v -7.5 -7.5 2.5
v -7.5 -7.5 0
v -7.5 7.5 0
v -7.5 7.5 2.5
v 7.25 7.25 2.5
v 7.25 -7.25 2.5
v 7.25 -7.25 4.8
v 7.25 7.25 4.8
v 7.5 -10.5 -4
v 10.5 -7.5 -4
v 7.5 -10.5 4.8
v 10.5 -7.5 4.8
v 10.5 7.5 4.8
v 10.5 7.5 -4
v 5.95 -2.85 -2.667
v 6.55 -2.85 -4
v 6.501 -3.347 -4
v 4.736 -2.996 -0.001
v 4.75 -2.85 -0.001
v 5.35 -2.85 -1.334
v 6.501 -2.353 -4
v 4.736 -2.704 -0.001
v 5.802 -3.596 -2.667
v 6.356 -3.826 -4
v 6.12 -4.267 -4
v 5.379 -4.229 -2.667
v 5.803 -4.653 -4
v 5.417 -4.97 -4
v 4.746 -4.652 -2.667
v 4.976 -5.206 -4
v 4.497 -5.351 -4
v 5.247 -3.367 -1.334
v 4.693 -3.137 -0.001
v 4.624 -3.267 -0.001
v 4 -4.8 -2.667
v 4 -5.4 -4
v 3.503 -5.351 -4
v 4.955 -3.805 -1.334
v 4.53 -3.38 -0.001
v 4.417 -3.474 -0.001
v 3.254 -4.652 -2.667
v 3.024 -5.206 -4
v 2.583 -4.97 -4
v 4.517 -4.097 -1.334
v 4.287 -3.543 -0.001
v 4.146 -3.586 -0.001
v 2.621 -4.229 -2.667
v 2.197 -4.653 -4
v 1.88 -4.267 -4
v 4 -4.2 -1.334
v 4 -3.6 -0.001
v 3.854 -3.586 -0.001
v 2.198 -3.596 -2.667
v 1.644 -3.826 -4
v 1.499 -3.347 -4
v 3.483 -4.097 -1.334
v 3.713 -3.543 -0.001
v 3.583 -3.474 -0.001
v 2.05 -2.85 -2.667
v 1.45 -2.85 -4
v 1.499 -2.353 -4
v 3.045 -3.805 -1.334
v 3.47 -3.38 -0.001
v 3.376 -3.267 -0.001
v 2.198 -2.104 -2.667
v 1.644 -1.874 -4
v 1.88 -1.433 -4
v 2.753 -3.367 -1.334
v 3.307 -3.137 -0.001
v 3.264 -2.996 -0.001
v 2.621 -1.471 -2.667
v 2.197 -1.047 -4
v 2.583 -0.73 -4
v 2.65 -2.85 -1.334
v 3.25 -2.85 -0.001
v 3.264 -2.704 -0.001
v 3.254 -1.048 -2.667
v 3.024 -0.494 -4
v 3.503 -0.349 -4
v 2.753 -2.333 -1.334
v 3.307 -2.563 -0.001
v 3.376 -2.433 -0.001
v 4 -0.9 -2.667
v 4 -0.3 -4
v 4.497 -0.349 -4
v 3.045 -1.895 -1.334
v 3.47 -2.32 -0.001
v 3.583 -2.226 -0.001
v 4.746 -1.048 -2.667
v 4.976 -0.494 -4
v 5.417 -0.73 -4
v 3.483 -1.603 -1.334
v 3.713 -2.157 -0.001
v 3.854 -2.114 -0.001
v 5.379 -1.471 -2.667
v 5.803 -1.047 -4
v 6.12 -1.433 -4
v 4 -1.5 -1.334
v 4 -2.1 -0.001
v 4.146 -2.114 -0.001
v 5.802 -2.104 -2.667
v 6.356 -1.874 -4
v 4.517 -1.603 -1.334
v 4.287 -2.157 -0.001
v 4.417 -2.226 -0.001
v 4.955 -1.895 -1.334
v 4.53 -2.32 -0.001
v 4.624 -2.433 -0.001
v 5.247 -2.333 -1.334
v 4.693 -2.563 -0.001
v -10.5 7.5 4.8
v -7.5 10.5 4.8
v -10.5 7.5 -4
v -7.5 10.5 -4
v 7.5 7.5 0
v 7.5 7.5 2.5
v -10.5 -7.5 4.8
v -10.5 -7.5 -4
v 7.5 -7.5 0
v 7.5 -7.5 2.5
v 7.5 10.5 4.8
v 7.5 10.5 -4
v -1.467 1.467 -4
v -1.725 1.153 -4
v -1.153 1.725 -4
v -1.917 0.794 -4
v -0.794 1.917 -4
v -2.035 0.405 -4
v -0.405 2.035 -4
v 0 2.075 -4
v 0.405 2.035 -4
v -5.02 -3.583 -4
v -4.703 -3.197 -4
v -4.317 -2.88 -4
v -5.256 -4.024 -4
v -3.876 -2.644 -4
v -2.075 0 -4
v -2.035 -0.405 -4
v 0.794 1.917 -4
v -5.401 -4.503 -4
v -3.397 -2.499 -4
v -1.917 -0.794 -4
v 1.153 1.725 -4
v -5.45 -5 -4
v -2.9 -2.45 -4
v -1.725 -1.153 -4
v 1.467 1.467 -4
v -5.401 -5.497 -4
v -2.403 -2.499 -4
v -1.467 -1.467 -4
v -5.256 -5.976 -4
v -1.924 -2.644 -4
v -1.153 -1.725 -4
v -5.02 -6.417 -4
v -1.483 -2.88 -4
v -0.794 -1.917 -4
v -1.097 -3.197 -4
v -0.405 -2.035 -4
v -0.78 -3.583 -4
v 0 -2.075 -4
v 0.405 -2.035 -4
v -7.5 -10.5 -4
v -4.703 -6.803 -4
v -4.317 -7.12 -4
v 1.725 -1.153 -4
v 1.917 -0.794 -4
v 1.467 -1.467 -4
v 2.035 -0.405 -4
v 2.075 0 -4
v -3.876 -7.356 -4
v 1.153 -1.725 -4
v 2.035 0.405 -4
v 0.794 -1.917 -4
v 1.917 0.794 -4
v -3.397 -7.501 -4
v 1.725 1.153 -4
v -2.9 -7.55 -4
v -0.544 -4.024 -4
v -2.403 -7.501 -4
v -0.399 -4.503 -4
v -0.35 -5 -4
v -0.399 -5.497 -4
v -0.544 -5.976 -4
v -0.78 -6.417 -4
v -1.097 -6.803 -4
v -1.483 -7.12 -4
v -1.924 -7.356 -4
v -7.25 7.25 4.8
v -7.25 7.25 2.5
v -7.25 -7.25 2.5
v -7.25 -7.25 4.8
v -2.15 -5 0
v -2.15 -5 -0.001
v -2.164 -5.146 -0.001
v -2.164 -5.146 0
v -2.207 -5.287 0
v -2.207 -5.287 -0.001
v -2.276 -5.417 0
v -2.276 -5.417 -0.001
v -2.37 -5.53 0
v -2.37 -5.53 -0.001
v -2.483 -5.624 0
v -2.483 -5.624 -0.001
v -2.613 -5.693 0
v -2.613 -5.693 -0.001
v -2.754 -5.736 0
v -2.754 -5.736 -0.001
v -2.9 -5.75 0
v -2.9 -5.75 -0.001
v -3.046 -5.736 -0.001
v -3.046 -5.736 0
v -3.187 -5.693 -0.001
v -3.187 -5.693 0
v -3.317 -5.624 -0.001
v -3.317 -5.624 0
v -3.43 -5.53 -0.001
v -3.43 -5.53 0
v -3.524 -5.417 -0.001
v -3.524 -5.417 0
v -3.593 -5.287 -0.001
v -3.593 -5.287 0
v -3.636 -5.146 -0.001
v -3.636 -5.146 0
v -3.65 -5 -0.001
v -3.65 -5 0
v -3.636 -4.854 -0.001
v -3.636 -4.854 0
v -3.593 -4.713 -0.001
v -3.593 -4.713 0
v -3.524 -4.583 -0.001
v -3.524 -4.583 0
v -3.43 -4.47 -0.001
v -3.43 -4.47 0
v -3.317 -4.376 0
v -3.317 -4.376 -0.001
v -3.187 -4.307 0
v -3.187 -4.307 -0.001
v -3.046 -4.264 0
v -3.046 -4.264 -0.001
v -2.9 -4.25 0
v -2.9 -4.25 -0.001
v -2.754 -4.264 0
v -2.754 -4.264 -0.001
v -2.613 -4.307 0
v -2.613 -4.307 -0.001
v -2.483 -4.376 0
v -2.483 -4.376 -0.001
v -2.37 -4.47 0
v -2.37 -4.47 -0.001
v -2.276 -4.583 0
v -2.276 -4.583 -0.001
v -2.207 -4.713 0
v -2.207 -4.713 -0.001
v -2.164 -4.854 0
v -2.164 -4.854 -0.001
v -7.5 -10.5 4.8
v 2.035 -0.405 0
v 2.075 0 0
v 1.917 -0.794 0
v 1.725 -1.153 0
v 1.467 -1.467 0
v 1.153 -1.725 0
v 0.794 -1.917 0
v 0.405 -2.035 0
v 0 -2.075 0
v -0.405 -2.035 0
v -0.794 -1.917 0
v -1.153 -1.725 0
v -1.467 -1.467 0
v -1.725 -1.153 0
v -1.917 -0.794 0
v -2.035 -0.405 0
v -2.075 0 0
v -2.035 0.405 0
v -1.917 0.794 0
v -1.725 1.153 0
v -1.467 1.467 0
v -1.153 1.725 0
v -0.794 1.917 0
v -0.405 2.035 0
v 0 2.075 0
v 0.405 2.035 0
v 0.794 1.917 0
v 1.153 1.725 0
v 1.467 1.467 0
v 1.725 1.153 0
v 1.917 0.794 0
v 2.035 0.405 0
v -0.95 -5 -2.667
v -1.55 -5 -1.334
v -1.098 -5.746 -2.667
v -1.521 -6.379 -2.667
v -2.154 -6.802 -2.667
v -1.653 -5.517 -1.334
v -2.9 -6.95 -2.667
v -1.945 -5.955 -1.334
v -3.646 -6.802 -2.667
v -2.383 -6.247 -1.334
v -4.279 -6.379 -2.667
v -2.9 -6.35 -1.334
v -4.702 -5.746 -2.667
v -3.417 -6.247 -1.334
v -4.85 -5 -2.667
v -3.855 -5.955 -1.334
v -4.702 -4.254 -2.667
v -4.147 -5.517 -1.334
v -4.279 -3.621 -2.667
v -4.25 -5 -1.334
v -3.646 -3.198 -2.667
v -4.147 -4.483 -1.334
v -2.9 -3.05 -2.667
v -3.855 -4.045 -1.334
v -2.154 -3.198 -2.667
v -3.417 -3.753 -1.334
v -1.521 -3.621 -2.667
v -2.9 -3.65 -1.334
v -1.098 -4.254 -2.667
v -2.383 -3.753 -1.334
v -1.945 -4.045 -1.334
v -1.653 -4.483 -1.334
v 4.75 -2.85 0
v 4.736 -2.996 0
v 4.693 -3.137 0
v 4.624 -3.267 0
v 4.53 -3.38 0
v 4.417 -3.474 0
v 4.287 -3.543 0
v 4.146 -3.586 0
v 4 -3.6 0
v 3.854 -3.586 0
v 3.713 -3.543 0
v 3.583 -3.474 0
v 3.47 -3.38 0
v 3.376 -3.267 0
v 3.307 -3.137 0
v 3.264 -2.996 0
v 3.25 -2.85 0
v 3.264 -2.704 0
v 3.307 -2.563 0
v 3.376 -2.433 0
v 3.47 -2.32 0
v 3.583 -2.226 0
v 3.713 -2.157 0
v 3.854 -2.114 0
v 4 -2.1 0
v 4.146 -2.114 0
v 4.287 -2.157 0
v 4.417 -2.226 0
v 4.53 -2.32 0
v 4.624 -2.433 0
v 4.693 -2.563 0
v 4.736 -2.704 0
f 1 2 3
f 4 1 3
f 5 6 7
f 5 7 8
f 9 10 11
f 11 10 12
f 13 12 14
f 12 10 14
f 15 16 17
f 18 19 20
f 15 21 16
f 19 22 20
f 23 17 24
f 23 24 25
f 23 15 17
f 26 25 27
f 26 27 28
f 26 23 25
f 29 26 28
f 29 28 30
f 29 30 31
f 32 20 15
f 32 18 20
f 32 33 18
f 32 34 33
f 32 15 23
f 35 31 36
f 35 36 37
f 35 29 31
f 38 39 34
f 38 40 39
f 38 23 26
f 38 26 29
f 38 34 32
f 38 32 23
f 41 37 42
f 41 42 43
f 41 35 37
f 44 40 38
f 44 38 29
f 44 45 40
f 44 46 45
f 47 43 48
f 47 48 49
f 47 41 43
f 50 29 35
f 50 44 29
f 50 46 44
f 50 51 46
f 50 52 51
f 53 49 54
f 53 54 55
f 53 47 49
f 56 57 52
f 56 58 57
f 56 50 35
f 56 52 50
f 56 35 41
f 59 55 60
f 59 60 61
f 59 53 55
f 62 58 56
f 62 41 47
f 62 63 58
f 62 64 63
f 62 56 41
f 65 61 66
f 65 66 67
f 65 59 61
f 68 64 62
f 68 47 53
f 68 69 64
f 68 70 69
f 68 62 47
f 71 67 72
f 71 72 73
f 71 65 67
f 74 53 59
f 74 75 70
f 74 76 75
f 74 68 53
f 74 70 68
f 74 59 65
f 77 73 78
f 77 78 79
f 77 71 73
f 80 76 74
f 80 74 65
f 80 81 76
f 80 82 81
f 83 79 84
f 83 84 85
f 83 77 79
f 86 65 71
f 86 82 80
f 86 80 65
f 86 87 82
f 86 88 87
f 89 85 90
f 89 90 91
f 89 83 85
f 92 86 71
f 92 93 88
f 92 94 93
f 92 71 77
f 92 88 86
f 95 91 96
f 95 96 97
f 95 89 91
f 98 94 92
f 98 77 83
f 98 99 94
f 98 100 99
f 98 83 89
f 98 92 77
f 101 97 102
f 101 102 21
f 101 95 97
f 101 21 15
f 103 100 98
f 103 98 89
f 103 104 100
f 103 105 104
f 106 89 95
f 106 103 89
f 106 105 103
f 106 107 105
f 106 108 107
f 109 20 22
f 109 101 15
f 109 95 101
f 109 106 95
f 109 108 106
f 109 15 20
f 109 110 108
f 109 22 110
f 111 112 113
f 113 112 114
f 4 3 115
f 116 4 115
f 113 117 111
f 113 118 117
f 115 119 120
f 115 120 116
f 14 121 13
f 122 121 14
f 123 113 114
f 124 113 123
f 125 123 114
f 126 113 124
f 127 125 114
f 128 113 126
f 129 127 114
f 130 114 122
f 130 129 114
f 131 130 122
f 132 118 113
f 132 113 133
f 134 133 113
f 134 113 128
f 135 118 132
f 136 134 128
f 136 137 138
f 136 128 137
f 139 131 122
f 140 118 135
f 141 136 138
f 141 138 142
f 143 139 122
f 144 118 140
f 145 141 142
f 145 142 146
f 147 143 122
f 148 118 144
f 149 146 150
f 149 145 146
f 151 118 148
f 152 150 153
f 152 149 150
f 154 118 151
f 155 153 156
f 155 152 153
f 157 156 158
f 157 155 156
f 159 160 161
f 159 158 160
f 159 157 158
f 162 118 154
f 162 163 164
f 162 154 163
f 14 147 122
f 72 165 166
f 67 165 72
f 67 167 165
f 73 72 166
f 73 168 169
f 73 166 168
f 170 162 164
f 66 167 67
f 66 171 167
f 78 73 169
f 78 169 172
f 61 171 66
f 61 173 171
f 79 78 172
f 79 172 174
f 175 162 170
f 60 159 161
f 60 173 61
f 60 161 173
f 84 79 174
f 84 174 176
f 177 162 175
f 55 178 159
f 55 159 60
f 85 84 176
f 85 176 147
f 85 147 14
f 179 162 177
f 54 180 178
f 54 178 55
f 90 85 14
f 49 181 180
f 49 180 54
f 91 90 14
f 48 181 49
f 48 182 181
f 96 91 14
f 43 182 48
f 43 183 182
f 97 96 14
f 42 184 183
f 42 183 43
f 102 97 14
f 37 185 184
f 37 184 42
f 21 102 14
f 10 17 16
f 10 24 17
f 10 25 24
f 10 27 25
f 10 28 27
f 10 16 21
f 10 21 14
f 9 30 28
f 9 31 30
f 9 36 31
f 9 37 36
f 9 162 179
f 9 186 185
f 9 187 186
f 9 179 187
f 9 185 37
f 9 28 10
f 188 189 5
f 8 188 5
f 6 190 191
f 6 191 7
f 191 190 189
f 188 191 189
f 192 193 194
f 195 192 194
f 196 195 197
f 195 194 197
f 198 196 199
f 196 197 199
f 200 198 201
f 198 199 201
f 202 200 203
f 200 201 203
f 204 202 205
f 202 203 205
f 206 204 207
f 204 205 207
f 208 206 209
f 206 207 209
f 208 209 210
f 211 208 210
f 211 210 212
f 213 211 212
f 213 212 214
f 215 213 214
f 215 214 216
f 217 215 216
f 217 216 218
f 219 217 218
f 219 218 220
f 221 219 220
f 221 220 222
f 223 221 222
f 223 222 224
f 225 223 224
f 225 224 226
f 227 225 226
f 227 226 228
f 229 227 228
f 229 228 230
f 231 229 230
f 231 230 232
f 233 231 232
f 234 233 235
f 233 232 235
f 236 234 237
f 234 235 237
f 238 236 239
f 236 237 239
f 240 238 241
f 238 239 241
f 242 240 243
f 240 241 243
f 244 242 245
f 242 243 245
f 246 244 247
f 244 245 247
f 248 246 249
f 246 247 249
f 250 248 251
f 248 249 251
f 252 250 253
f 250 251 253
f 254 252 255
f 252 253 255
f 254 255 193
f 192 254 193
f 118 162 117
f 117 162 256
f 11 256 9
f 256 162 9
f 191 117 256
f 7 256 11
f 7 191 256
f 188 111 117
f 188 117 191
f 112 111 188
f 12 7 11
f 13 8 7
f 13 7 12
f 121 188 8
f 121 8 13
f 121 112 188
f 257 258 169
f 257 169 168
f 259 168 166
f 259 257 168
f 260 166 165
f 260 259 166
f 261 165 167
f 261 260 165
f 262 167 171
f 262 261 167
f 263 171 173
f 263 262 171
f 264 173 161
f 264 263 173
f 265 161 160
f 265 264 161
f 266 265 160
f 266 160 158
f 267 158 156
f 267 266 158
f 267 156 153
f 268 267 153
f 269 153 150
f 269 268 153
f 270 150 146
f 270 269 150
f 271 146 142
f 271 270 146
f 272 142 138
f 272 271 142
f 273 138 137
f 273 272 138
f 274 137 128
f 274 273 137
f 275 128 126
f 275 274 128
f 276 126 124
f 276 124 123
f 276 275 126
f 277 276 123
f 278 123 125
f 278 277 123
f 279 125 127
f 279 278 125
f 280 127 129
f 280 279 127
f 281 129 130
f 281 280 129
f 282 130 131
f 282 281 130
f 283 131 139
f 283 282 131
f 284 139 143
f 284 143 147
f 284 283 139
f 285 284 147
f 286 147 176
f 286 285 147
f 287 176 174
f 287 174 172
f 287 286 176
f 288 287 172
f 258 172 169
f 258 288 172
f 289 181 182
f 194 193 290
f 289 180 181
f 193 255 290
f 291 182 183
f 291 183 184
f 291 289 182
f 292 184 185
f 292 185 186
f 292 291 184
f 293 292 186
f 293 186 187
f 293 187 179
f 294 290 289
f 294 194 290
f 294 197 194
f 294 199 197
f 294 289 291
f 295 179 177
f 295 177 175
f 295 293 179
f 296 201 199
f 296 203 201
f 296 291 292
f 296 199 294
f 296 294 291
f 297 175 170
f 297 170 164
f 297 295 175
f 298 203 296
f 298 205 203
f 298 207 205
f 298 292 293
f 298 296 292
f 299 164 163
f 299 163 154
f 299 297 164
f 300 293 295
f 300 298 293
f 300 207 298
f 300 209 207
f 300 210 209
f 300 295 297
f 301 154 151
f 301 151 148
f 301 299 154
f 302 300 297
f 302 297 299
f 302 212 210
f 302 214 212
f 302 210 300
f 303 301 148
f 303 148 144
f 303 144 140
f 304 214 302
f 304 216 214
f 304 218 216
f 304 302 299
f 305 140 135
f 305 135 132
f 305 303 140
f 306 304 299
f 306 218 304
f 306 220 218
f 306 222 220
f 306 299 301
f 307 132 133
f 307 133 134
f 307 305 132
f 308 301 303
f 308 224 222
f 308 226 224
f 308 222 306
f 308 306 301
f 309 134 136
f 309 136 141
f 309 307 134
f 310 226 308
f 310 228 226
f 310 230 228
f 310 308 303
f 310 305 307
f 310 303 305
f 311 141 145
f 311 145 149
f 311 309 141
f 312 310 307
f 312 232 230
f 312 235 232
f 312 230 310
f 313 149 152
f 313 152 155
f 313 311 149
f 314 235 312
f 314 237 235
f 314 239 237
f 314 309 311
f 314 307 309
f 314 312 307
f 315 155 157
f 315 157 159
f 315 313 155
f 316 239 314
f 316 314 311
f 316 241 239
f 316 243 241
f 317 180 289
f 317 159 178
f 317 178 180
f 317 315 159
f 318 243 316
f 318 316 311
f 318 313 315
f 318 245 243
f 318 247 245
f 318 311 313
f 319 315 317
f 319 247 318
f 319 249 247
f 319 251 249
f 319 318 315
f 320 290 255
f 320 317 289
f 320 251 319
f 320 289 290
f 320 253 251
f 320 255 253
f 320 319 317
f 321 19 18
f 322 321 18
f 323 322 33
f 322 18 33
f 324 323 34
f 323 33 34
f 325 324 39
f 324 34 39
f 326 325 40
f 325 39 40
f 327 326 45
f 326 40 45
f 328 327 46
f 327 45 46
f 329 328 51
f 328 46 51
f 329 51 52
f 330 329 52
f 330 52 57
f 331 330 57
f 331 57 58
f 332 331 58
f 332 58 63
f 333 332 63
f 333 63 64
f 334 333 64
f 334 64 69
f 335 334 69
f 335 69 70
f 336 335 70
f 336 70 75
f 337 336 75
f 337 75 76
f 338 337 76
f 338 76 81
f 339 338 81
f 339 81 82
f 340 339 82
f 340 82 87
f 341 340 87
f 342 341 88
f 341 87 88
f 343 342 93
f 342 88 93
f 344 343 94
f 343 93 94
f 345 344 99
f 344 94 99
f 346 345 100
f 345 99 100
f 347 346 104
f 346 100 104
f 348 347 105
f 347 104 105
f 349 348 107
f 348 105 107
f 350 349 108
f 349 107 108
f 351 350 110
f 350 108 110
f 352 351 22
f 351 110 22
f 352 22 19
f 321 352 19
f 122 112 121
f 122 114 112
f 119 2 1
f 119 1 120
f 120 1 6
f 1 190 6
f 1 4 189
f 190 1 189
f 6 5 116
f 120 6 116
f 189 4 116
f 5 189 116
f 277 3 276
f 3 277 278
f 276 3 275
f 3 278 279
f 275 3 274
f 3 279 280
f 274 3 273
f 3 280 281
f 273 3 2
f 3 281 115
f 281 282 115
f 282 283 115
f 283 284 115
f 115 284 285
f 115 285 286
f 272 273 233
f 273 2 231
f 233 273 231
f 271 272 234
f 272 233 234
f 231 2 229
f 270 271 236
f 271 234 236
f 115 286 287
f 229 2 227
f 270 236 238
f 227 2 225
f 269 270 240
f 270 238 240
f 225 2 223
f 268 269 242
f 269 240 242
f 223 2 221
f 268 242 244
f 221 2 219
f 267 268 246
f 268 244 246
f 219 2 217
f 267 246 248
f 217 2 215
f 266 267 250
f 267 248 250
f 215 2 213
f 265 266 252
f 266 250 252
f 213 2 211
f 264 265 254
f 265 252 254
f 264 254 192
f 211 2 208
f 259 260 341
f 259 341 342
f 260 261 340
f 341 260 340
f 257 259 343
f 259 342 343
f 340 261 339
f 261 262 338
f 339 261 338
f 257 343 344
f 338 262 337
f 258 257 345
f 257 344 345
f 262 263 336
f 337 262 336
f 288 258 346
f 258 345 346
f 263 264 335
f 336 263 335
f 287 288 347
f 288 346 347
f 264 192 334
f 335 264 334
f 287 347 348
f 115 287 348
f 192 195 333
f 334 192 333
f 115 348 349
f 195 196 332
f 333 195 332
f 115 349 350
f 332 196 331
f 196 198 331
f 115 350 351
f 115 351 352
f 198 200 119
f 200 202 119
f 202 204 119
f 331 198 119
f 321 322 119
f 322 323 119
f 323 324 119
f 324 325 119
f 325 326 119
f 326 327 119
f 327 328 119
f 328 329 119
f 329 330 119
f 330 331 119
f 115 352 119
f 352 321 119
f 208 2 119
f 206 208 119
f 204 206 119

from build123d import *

# Parameters (mm, degrees)
SKETCH_W         = 21
SKETCH_H         = 21
SKETCH_W_2       = 15
SKETCH_H_2       = 15
PAD_DEPTH        = 2.5
SKETCH001_W      = 21
SKETCH001_H      = 21
SKETCH001_R      = 2.075
PAD001_DEPTH     = 4
SKETCH002_W      = 21
SKETCH002_H      = 21
SKETCH002_W_2    = 14.5
SKETCH002_H_2    = 14.5
PAD002_DEPTH     = 2.3
CHAMFER_SIZE     = 3
SKETCH003_R      = 0.75
POCKET_DEPTH     = 8.801
CHAMFER001_SIZE2 = 3.999
CHAMFER001_SIZE  = 1.8


with BuildPart() as part:
    # Sketch → Pad (new body)
    with BuildSketch(Plane.XY):
        Rectangle(SKETCH_W, SKETCH_H)
        Rectangle(SKETCH_W_2, SKETCH_H_2, mode=Mode.SUBTRACT)
    extrude(amount=PAD_DEPTH)

    # Sketch001 (on Face9 of Pad) → Pad001 (join)
    with BuildSketch(Plane(origin=(0, 0, 0), x_dir=(1, 0, 0), z_dir=(0, 0, -1))):
        Rectangle(SKETCH001_W, SKETCH001_H)
        Circle(SKETCH001_R, mode=Mode.SUBTRACT)
    extrude(amount=PAD001_DEPTH)

    # Sketch002 (on Face5 of Pad001) → Pad002 (join)
    with BuildSketch(Plane.XY.offset(2.5)):
        Rectangle(SKETCH002_W, SKETCH002_H)
        Rectangle(SKETCH002_W_2, SKETCH002_H_2, mode=Mode.SUBTRACT)
    extrude(amount=PAD002_DEPTH)

    # Chamfer
    chamfer_edges = [part.edges().sort_by_distance(p)[0] for p in [
        (-10.5, -10.5, -2),
        (10.5, -10.5, -2),
        (10.5, 10.5, -2),
        (-10.5, 10.5, -2),
    ]]
    chamfer(chamfer_edges, length=CHAMFER_SIZE)

    # Sketch003 (on Face8 of Chamfer) → Pocket (cut, through all)
    with BuildSketch(Plane(origin=(0, 0, -4), x_dir=(1, 0, 0), z_dir=(0, 0, -1))):
        with Locations((4, 2.85)):
            Circle(SKETCH003_R)
        with Locations((-2.9, 5)):
            Circle(SKETCH003_R)
    extrude(amount=-POCKET_DEPTH, mode=Mode.SUBTRACT)

    # Chamfer001
    chamfer001_edges = [part.edges().sort_by_distance(p)[0] for p in [
        (3.25, -2.85, -4),
        (-3.65, -5, -4),
    ]]
    chamfer001_side = part.faces().sort_by_distance((0, -10.203015, -4))[0]
    chamfer(chamfer001_edges, length=CHAMFER001_SIZE, length2=CHAMFER001_SIZE2, reference=chamfer001_side)


solid = part.part
